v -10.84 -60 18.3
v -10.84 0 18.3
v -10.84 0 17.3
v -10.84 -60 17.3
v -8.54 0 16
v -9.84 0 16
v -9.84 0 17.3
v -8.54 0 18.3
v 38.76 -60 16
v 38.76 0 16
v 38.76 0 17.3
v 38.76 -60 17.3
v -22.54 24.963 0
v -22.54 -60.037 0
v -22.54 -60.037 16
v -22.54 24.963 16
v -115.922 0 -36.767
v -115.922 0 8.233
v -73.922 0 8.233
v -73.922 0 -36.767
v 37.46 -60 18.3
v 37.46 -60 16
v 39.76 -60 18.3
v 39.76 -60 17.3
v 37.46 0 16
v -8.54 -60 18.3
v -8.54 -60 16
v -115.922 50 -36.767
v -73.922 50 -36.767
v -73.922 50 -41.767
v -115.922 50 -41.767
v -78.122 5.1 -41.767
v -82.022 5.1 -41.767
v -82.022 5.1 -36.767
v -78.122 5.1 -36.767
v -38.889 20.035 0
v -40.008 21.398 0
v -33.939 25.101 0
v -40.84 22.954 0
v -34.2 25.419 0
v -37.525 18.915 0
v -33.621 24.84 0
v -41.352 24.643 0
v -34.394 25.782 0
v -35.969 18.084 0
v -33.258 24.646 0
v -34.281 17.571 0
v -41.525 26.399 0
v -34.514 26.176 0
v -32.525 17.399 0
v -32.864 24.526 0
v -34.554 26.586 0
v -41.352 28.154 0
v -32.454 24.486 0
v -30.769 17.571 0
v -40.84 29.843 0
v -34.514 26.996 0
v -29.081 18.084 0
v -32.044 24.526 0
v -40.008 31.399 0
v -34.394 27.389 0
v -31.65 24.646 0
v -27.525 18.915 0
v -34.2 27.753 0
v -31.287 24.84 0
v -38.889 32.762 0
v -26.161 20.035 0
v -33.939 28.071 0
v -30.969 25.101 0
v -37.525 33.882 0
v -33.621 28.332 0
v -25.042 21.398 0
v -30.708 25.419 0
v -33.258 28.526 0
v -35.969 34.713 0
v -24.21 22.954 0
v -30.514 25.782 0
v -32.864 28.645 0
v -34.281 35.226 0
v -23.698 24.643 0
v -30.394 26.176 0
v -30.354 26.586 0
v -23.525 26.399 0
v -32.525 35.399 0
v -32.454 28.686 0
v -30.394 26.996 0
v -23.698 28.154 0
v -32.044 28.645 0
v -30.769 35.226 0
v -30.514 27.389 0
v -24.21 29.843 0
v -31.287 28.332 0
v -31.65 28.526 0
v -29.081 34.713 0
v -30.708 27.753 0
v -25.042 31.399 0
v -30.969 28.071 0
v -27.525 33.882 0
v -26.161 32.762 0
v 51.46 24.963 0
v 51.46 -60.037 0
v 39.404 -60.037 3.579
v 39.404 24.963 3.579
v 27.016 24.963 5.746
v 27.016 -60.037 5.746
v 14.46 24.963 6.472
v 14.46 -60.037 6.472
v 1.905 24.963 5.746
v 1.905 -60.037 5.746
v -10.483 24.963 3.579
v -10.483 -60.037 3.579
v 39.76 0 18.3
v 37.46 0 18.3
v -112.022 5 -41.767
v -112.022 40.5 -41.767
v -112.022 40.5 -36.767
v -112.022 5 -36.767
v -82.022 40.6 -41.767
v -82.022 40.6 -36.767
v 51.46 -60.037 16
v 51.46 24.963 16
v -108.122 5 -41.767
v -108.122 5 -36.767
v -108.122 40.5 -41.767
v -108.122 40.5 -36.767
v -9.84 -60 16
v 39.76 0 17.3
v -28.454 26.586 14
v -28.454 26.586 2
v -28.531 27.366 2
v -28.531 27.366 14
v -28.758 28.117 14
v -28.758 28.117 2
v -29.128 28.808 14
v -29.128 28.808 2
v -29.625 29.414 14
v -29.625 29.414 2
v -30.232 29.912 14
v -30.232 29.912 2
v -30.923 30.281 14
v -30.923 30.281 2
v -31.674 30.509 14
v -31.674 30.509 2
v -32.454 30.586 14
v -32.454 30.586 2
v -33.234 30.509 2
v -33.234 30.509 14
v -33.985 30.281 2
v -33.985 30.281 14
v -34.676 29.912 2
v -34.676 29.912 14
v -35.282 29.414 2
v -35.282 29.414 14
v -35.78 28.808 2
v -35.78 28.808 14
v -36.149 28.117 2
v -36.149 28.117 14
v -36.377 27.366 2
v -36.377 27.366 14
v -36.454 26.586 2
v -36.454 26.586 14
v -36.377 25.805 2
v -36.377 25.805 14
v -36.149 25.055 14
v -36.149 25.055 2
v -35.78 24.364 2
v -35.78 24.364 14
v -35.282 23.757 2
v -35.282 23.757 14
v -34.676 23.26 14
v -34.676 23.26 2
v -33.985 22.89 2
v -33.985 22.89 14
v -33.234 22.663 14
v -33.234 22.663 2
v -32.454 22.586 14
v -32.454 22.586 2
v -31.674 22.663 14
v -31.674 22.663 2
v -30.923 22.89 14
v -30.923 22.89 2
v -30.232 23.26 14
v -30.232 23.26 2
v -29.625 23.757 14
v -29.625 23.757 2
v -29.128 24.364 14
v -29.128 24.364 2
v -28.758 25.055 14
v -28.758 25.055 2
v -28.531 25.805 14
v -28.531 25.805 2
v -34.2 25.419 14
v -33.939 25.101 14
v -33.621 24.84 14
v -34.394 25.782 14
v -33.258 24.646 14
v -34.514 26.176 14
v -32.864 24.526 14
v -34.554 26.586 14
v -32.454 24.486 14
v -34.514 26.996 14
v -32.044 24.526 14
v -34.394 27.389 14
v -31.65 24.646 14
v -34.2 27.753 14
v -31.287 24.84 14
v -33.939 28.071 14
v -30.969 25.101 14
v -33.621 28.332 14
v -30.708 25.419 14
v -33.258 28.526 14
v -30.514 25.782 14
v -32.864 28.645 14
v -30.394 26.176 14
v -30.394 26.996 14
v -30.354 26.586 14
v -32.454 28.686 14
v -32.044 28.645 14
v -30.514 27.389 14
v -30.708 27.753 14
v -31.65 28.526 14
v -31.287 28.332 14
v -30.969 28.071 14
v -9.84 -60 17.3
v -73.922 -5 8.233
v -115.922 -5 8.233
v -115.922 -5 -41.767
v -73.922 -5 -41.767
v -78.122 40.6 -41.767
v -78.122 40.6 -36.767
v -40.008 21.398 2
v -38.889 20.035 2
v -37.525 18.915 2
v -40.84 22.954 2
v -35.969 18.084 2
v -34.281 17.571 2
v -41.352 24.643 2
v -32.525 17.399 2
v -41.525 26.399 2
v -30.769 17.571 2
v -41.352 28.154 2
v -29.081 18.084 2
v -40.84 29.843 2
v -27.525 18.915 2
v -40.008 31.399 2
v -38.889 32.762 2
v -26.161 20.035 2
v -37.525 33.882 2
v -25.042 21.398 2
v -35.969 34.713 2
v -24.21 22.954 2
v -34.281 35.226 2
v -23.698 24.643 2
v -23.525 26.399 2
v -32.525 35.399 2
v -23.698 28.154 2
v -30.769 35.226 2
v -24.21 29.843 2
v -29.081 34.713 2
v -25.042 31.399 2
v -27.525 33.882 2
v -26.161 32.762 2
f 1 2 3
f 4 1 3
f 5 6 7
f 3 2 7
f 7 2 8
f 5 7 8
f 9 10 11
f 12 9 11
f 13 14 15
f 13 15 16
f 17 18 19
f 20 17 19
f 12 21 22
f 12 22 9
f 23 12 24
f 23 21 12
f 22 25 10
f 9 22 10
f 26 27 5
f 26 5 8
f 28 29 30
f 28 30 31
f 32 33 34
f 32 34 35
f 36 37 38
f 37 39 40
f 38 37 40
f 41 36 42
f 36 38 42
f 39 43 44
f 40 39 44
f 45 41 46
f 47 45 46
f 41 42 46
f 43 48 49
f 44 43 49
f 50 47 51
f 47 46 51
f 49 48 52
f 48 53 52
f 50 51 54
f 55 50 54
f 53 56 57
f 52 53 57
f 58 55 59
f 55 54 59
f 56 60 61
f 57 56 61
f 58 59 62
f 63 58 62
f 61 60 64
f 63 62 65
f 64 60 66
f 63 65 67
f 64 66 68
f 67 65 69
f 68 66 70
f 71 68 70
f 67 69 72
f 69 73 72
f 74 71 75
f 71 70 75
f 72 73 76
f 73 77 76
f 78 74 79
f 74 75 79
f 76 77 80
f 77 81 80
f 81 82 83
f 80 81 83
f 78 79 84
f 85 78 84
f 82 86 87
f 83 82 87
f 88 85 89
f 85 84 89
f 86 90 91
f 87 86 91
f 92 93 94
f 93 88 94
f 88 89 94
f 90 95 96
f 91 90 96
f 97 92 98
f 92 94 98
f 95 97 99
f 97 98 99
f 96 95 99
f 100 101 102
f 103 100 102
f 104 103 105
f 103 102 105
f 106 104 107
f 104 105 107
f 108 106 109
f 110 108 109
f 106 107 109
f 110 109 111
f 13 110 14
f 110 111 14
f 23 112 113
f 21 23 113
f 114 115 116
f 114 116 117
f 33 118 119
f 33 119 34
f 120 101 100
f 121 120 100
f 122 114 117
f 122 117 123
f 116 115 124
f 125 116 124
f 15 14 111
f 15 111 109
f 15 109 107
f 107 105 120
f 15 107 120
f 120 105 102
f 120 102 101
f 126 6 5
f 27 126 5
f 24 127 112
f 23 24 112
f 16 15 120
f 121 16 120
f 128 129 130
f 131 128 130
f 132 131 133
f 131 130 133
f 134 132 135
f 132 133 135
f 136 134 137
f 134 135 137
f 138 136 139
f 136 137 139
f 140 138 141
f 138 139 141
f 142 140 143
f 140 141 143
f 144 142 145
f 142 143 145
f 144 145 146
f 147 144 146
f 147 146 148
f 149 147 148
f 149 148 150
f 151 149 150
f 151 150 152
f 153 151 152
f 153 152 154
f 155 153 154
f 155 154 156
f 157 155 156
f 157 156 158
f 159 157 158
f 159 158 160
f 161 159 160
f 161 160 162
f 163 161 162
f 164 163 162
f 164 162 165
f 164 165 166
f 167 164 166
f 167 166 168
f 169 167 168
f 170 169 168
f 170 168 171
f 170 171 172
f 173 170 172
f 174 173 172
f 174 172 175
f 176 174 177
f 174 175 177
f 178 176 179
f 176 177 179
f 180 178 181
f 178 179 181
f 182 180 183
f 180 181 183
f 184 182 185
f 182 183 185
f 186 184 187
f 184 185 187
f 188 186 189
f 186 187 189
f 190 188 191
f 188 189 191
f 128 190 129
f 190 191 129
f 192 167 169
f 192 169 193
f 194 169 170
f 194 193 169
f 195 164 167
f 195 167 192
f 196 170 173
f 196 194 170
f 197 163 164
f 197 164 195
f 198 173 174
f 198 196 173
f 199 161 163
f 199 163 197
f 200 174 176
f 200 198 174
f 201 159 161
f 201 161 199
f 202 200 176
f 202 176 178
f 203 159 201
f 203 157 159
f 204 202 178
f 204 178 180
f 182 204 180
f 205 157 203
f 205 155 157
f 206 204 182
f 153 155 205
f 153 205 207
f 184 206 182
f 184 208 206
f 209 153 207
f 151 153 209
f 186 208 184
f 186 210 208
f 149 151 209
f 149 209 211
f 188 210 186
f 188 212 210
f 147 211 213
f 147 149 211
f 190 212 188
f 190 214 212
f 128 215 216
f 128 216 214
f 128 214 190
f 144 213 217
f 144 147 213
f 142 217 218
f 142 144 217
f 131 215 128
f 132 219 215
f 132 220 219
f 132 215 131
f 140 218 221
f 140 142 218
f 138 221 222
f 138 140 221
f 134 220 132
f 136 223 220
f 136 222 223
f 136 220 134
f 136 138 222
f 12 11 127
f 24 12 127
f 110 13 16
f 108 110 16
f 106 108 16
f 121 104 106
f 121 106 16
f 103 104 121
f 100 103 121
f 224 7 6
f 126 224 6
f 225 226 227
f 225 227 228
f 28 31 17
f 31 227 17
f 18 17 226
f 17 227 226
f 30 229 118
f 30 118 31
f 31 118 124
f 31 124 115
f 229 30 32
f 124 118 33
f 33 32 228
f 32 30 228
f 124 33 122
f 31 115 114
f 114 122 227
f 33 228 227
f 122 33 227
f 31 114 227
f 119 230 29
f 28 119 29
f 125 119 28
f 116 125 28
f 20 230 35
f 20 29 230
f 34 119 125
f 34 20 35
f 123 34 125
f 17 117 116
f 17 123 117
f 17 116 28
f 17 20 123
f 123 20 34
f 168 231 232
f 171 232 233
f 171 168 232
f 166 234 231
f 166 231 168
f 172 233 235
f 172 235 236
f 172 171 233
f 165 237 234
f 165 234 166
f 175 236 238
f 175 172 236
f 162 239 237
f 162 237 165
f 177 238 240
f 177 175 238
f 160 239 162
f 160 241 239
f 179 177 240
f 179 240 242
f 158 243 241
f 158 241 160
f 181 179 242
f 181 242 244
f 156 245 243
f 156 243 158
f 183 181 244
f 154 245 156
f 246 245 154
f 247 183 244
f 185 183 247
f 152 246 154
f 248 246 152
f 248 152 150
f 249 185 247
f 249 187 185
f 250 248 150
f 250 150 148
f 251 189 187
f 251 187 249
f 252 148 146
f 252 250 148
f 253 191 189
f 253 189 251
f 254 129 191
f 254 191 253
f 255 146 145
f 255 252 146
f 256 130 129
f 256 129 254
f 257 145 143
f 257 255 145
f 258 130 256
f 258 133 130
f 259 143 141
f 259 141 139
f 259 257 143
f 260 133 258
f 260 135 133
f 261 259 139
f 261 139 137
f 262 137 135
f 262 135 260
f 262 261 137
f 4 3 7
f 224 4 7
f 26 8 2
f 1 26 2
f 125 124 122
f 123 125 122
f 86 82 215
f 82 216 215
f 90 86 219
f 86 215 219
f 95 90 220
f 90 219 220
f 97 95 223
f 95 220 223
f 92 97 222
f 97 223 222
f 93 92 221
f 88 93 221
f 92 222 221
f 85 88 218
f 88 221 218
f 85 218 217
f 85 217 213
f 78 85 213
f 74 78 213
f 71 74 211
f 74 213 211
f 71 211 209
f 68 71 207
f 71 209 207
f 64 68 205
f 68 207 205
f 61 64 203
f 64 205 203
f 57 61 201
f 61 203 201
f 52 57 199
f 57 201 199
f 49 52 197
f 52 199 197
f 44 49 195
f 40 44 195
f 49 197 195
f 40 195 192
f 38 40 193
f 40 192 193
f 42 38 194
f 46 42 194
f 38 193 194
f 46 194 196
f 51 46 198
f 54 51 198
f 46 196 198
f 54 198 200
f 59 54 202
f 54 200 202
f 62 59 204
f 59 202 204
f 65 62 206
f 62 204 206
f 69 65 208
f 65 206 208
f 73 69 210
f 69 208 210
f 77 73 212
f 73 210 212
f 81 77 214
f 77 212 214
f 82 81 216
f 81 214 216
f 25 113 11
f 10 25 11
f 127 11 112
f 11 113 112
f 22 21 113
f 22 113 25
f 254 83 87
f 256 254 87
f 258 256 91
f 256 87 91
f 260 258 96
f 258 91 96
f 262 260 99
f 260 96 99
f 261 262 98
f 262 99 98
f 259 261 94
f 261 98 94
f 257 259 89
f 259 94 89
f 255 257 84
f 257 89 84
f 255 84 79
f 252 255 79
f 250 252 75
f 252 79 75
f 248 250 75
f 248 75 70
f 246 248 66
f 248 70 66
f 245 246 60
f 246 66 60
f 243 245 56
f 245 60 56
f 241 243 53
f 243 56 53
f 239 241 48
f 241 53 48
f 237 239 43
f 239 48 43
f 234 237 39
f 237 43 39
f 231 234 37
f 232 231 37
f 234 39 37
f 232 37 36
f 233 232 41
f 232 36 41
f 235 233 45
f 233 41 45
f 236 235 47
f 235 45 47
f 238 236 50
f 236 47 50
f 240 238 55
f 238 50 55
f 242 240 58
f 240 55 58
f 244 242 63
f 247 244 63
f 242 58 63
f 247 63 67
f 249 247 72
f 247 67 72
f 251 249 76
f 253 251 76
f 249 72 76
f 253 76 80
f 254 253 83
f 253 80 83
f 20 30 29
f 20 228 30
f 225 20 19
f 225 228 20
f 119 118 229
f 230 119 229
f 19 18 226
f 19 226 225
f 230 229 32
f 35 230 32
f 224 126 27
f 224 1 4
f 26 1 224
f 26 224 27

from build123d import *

# Parameters (mm, degrees)
F0_R      = 9
F2_DEPTH  = 2
F1_R      = 4
F1_R_2    = 2.1
F3_DEPTH  = 14
F3_FACE_R = 2.1
F4_DEPTH  = 2
F5_W      = 74
F5_H      = 85
F6_DEPTH  = 16
F8_DEPTH  = 85
F10_DEPTH = 60
F11_W     = 42
F11_H     = 50
F12_DEPTH = 5
F13_W     = 42
F13_H     = 5
F14_DEPTH = 50
F15_W     = 3.9
F15_H     = 35.5
F16_DEPTH = 5


with BuildPart() as f2:
    # F0 (on Top) → F2 (new body)
    with BuildSketch(Plane.XY):
        with Locations((-32.524753, 26.398515)):
            Circle(F0_R)
    extrude(amount=F2_DEPTH)

    # F1 (on Top) → F3 (join)
    with BuildSketch(Plane.XY):
        with Locations((-32.453865, 26.585845)):
            Circle(F1_R)
        with Locations((-32.453865, 26.585845)):
            Circle(F1_R_2, mode=Mode.SUBTRACT)
    extrude(amount=F3_DEPTH)

    # F3_face (on face) → F4 (cut)
    with BuildSketch(Plane(origin=(-32.453865, 26.585845, 2), x_dir=(1, 0, 0), z_dir=(0, 0, 1))):
        Circle(F3_FACE_R)
    extrude(amount=-F4_DEPTH, mode=Mode.SUBTRACT)


with BuildPart() as f6:
    # F5 (on Top) → F6 (new body)
    with BuildSketch(Plane.XY):
        with Locations((14.460396, -17.537132)):
            Rectangle(F5_W, F5_H)
    extrude(amount=F6_DEPTH)

    # F7 (on face) → F8 (cut)
    with BuildSketch(Plane.XZ.offset(60.037132)):
        with BuildLine():
            Line((-22.539604, 0), (51.460396, 0))
            ThreePointArc((51.460396, 0), (14.460396, 6.471955), (-22.539604, 0))
        make_face()
    extrude(amount=-F8_DEPTH, mode=Mode.SUBTRACT)


with BuildPart() as f10:
    # F9 (on Front) → F10 (new body)
    with BuildSketch(Plane.XZ):
        Polygon((-9.839604, 16), (-8.539604, 16), (-8.539604, 18.3), (-10.839604, 18.3), (-10.839604, 17.3), (-9.839604, 17.3), align=None)
        Polygon((37.460396, 18.3), (37.460396, 16), (38.760396, 16), (38.760396, 17.3), (39.760396, 17.3), (39.760396, 18.3), align=None)
    extrude(amount=F10_DEPTH)


with BuildPart() as f12:
    # F11 (on Front) → F12 (new body)
    with BuildSketch(Plane.XZ):
        with Locations((-94.921915, -16.766828)):
            Rectangle(F11_W, F11_H)
    extrude(amount=F12_DEPTH)

    # F13 (on face) → F14 (join)
    with BuildSketch(Plane(origin=(0, 0, 0), x_dir=(-1, 0, 0), z_dir=(0, 1, 0))):
        with Locations((94.921915, -39.266828)):
            Rectangle(F13_W, F13_H)
    extrude(amount=F14_DEPTH)

    # F15 (on face) → F16 (cut)
    with BuildSketch(Plane(origin=(0, 0, -41.766828), x_dir=(1, 0, 0), z_dir=(0, 0, -1))):
        with Locations((-110.071915, -22.75)):
            Rectangle(F15_W, F15_H)
        with Locations((-80.072081, -22.849926)):
            Rectangle(F15_W, F15_H)
    extrude(amount=-F16_DEPTH, mode=Mode.SUBTRACT)


solid = Compound([f2.part, f6.part, f10.part, f12.part])
